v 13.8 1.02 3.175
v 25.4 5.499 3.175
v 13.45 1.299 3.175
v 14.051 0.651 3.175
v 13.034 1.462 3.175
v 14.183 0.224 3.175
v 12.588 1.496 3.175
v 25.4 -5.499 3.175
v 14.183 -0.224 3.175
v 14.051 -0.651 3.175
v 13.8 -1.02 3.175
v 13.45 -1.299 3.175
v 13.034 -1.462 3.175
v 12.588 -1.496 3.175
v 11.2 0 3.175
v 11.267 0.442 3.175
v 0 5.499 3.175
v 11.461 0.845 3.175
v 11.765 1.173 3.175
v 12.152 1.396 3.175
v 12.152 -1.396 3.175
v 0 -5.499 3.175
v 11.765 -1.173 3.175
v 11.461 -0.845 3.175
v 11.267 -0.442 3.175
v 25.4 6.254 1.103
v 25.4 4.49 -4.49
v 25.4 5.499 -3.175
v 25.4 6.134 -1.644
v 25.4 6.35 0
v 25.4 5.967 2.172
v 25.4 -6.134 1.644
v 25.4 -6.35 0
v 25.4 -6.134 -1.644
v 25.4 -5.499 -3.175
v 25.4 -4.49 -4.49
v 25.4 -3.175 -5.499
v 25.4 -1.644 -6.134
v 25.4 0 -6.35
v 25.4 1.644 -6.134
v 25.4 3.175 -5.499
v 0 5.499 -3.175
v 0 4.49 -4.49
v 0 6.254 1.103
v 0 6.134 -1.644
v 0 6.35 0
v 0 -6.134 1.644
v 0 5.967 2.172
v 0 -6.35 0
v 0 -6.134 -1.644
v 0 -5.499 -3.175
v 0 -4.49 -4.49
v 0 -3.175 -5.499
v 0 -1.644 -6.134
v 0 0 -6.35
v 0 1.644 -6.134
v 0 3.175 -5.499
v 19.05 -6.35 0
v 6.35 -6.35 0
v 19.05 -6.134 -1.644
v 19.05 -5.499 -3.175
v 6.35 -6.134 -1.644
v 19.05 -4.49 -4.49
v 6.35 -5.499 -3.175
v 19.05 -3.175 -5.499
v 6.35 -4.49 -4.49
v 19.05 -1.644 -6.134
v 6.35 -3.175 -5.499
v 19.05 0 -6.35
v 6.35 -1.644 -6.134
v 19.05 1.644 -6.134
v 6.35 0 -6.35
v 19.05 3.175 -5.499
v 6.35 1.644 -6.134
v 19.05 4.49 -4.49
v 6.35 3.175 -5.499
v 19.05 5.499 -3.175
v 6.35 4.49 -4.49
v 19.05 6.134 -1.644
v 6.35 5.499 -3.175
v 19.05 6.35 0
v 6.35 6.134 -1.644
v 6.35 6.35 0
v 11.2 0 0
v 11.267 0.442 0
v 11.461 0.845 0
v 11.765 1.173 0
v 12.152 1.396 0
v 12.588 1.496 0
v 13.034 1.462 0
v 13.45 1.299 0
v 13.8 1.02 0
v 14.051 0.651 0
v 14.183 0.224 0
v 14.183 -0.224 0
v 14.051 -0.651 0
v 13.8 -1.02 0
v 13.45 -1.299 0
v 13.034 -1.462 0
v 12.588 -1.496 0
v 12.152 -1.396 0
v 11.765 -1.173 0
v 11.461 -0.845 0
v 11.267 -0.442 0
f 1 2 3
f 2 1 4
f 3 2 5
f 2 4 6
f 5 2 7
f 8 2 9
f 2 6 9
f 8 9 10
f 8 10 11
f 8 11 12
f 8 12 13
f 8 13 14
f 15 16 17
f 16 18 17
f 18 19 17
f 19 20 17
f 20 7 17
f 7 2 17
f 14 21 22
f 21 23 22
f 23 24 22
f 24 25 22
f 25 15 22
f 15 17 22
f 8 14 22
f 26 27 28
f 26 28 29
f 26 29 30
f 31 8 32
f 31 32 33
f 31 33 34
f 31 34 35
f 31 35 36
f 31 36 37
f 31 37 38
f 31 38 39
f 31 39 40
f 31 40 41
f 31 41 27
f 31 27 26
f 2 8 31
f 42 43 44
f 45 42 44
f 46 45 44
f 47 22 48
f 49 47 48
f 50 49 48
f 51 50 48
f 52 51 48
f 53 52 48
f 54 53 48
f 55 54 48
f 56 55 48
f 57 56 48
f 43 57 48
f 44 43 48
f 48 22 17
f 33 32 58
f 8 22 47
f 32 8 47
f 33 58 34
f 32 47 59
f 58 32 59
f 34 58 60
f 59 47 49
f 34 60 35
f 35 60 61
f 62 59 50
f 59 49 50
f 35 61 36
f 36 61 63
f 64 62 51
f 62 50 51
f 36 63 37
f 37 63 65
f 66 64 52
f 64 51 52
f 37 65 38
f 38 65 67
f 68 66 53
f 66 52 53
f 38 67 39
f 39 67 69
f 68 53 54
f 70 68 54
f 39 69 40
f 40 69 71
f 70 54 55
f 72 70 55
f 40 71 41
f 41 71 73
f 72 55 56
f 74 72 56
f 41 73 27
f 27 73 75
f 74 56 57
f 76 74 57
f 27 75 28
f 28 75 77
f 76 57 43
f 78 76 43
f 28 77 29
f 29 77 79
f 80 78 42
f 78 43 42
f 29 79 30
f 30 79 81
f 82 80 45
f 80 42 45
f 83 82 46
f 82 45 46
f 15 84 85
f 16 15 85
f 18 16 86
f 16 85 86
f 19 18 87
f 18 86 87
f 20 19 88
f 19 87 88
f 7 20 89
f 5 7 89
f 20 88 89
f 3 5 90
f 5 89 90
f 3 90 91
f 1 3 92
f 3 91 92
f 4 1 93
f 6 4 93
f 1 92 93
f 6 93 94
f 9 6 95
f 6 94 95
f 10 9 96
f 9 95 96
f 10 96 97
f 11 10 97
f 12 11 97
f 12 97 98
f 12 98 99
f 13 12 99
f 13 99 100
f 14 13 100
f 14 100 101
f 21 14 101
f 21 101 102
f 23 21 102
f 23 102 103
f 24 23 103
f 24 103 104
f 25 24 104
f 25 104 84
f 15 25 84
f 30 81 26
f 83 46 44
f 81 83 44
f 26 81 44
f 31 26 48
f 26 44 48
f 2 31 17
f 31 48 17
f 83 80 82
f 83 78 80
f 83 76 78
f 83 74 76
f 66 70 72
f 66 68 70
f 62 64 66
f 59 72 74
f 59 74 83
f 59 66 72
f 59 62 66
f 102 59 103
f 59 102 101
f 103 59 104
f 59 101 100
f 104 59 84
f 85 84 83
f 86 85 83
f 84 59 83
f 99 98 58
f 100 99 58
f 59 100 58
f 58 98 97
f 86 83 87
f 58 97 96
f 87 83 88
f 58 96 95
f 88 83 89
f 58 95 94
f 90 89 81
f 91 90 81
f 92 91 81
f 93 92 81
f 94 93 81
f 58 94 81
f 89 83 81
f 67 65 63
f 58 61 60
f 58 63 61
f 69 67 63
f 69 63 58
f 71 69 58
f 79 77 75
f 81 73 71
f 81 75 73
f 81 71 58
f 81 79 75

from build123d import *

# Parameters (mm, degrees)
F1_DEPTH = 25.4
F2_W     = 12.7
F2_H     = 6.604
F3_DEPTH = 25.4
F4_DEPTH = 25.4
F6_DEPTH = 25.4


with BuildPart() as f1:
    # F0 (on Right) → F1 (new body)
    with BuildSketch(Plane.YZ):
        with BuildLine():
            ThreePointArc((-5.499261314, 3.175), (-1.6435009364, -6.1336289969), (6.35, 0))
            ThreePointArc((6.35, 0), (6.1336289969, 1.6435009364), (5.499261314, 3.175))
            Line((5.499261314, 3.175), (0, 3.175))
            Line((0, 3.175), (-5.499261314, 3.175))
        make_face()
    extrude(amount=F1_DEPTH)

    # F2 (on Front) → F3 (cut)
    with BuildSketch(Plane.XZ):
        with Locations((12.7, -3.302)):
            Rectangle(F2_W, F2_H)
    extrude(amount=-F3_DEPTH, mode=Mode.SUBTRACT)

    # F4 (cut): a face of the model
    f4_faces = [f1.faces().sort_by_distance(p)[0] for p in [
        (12.7, 0, -3.175),
    ]]
    extrude(f4_faces, amount=-F4_DEPTH, mode=Mode.SUBTRACT)

    # F5 (on face) → F6 (cut)
    with BuildSketch(Plane(origin=(0, 0, 0), x_dir=(1, 0, 0), z_dir=(0, 0, -1))):
        with BuildLine():
            Line((11.2, 0), (14.2, 0))
            ThreePointArc((14.2, 0), (12.7, 1.5), (11.2, 0))
        make_face()
        with BuildLine():
            ThreePointArc((11.2, 0), (12.7, -1.5), (14.2, 0))
            Line((14.2, 0), (11.2, 0))
        make_face()
    extrude(amount=-F6_DEPTH, mode=Mode.SUBTRACT)


solid = f1.part
